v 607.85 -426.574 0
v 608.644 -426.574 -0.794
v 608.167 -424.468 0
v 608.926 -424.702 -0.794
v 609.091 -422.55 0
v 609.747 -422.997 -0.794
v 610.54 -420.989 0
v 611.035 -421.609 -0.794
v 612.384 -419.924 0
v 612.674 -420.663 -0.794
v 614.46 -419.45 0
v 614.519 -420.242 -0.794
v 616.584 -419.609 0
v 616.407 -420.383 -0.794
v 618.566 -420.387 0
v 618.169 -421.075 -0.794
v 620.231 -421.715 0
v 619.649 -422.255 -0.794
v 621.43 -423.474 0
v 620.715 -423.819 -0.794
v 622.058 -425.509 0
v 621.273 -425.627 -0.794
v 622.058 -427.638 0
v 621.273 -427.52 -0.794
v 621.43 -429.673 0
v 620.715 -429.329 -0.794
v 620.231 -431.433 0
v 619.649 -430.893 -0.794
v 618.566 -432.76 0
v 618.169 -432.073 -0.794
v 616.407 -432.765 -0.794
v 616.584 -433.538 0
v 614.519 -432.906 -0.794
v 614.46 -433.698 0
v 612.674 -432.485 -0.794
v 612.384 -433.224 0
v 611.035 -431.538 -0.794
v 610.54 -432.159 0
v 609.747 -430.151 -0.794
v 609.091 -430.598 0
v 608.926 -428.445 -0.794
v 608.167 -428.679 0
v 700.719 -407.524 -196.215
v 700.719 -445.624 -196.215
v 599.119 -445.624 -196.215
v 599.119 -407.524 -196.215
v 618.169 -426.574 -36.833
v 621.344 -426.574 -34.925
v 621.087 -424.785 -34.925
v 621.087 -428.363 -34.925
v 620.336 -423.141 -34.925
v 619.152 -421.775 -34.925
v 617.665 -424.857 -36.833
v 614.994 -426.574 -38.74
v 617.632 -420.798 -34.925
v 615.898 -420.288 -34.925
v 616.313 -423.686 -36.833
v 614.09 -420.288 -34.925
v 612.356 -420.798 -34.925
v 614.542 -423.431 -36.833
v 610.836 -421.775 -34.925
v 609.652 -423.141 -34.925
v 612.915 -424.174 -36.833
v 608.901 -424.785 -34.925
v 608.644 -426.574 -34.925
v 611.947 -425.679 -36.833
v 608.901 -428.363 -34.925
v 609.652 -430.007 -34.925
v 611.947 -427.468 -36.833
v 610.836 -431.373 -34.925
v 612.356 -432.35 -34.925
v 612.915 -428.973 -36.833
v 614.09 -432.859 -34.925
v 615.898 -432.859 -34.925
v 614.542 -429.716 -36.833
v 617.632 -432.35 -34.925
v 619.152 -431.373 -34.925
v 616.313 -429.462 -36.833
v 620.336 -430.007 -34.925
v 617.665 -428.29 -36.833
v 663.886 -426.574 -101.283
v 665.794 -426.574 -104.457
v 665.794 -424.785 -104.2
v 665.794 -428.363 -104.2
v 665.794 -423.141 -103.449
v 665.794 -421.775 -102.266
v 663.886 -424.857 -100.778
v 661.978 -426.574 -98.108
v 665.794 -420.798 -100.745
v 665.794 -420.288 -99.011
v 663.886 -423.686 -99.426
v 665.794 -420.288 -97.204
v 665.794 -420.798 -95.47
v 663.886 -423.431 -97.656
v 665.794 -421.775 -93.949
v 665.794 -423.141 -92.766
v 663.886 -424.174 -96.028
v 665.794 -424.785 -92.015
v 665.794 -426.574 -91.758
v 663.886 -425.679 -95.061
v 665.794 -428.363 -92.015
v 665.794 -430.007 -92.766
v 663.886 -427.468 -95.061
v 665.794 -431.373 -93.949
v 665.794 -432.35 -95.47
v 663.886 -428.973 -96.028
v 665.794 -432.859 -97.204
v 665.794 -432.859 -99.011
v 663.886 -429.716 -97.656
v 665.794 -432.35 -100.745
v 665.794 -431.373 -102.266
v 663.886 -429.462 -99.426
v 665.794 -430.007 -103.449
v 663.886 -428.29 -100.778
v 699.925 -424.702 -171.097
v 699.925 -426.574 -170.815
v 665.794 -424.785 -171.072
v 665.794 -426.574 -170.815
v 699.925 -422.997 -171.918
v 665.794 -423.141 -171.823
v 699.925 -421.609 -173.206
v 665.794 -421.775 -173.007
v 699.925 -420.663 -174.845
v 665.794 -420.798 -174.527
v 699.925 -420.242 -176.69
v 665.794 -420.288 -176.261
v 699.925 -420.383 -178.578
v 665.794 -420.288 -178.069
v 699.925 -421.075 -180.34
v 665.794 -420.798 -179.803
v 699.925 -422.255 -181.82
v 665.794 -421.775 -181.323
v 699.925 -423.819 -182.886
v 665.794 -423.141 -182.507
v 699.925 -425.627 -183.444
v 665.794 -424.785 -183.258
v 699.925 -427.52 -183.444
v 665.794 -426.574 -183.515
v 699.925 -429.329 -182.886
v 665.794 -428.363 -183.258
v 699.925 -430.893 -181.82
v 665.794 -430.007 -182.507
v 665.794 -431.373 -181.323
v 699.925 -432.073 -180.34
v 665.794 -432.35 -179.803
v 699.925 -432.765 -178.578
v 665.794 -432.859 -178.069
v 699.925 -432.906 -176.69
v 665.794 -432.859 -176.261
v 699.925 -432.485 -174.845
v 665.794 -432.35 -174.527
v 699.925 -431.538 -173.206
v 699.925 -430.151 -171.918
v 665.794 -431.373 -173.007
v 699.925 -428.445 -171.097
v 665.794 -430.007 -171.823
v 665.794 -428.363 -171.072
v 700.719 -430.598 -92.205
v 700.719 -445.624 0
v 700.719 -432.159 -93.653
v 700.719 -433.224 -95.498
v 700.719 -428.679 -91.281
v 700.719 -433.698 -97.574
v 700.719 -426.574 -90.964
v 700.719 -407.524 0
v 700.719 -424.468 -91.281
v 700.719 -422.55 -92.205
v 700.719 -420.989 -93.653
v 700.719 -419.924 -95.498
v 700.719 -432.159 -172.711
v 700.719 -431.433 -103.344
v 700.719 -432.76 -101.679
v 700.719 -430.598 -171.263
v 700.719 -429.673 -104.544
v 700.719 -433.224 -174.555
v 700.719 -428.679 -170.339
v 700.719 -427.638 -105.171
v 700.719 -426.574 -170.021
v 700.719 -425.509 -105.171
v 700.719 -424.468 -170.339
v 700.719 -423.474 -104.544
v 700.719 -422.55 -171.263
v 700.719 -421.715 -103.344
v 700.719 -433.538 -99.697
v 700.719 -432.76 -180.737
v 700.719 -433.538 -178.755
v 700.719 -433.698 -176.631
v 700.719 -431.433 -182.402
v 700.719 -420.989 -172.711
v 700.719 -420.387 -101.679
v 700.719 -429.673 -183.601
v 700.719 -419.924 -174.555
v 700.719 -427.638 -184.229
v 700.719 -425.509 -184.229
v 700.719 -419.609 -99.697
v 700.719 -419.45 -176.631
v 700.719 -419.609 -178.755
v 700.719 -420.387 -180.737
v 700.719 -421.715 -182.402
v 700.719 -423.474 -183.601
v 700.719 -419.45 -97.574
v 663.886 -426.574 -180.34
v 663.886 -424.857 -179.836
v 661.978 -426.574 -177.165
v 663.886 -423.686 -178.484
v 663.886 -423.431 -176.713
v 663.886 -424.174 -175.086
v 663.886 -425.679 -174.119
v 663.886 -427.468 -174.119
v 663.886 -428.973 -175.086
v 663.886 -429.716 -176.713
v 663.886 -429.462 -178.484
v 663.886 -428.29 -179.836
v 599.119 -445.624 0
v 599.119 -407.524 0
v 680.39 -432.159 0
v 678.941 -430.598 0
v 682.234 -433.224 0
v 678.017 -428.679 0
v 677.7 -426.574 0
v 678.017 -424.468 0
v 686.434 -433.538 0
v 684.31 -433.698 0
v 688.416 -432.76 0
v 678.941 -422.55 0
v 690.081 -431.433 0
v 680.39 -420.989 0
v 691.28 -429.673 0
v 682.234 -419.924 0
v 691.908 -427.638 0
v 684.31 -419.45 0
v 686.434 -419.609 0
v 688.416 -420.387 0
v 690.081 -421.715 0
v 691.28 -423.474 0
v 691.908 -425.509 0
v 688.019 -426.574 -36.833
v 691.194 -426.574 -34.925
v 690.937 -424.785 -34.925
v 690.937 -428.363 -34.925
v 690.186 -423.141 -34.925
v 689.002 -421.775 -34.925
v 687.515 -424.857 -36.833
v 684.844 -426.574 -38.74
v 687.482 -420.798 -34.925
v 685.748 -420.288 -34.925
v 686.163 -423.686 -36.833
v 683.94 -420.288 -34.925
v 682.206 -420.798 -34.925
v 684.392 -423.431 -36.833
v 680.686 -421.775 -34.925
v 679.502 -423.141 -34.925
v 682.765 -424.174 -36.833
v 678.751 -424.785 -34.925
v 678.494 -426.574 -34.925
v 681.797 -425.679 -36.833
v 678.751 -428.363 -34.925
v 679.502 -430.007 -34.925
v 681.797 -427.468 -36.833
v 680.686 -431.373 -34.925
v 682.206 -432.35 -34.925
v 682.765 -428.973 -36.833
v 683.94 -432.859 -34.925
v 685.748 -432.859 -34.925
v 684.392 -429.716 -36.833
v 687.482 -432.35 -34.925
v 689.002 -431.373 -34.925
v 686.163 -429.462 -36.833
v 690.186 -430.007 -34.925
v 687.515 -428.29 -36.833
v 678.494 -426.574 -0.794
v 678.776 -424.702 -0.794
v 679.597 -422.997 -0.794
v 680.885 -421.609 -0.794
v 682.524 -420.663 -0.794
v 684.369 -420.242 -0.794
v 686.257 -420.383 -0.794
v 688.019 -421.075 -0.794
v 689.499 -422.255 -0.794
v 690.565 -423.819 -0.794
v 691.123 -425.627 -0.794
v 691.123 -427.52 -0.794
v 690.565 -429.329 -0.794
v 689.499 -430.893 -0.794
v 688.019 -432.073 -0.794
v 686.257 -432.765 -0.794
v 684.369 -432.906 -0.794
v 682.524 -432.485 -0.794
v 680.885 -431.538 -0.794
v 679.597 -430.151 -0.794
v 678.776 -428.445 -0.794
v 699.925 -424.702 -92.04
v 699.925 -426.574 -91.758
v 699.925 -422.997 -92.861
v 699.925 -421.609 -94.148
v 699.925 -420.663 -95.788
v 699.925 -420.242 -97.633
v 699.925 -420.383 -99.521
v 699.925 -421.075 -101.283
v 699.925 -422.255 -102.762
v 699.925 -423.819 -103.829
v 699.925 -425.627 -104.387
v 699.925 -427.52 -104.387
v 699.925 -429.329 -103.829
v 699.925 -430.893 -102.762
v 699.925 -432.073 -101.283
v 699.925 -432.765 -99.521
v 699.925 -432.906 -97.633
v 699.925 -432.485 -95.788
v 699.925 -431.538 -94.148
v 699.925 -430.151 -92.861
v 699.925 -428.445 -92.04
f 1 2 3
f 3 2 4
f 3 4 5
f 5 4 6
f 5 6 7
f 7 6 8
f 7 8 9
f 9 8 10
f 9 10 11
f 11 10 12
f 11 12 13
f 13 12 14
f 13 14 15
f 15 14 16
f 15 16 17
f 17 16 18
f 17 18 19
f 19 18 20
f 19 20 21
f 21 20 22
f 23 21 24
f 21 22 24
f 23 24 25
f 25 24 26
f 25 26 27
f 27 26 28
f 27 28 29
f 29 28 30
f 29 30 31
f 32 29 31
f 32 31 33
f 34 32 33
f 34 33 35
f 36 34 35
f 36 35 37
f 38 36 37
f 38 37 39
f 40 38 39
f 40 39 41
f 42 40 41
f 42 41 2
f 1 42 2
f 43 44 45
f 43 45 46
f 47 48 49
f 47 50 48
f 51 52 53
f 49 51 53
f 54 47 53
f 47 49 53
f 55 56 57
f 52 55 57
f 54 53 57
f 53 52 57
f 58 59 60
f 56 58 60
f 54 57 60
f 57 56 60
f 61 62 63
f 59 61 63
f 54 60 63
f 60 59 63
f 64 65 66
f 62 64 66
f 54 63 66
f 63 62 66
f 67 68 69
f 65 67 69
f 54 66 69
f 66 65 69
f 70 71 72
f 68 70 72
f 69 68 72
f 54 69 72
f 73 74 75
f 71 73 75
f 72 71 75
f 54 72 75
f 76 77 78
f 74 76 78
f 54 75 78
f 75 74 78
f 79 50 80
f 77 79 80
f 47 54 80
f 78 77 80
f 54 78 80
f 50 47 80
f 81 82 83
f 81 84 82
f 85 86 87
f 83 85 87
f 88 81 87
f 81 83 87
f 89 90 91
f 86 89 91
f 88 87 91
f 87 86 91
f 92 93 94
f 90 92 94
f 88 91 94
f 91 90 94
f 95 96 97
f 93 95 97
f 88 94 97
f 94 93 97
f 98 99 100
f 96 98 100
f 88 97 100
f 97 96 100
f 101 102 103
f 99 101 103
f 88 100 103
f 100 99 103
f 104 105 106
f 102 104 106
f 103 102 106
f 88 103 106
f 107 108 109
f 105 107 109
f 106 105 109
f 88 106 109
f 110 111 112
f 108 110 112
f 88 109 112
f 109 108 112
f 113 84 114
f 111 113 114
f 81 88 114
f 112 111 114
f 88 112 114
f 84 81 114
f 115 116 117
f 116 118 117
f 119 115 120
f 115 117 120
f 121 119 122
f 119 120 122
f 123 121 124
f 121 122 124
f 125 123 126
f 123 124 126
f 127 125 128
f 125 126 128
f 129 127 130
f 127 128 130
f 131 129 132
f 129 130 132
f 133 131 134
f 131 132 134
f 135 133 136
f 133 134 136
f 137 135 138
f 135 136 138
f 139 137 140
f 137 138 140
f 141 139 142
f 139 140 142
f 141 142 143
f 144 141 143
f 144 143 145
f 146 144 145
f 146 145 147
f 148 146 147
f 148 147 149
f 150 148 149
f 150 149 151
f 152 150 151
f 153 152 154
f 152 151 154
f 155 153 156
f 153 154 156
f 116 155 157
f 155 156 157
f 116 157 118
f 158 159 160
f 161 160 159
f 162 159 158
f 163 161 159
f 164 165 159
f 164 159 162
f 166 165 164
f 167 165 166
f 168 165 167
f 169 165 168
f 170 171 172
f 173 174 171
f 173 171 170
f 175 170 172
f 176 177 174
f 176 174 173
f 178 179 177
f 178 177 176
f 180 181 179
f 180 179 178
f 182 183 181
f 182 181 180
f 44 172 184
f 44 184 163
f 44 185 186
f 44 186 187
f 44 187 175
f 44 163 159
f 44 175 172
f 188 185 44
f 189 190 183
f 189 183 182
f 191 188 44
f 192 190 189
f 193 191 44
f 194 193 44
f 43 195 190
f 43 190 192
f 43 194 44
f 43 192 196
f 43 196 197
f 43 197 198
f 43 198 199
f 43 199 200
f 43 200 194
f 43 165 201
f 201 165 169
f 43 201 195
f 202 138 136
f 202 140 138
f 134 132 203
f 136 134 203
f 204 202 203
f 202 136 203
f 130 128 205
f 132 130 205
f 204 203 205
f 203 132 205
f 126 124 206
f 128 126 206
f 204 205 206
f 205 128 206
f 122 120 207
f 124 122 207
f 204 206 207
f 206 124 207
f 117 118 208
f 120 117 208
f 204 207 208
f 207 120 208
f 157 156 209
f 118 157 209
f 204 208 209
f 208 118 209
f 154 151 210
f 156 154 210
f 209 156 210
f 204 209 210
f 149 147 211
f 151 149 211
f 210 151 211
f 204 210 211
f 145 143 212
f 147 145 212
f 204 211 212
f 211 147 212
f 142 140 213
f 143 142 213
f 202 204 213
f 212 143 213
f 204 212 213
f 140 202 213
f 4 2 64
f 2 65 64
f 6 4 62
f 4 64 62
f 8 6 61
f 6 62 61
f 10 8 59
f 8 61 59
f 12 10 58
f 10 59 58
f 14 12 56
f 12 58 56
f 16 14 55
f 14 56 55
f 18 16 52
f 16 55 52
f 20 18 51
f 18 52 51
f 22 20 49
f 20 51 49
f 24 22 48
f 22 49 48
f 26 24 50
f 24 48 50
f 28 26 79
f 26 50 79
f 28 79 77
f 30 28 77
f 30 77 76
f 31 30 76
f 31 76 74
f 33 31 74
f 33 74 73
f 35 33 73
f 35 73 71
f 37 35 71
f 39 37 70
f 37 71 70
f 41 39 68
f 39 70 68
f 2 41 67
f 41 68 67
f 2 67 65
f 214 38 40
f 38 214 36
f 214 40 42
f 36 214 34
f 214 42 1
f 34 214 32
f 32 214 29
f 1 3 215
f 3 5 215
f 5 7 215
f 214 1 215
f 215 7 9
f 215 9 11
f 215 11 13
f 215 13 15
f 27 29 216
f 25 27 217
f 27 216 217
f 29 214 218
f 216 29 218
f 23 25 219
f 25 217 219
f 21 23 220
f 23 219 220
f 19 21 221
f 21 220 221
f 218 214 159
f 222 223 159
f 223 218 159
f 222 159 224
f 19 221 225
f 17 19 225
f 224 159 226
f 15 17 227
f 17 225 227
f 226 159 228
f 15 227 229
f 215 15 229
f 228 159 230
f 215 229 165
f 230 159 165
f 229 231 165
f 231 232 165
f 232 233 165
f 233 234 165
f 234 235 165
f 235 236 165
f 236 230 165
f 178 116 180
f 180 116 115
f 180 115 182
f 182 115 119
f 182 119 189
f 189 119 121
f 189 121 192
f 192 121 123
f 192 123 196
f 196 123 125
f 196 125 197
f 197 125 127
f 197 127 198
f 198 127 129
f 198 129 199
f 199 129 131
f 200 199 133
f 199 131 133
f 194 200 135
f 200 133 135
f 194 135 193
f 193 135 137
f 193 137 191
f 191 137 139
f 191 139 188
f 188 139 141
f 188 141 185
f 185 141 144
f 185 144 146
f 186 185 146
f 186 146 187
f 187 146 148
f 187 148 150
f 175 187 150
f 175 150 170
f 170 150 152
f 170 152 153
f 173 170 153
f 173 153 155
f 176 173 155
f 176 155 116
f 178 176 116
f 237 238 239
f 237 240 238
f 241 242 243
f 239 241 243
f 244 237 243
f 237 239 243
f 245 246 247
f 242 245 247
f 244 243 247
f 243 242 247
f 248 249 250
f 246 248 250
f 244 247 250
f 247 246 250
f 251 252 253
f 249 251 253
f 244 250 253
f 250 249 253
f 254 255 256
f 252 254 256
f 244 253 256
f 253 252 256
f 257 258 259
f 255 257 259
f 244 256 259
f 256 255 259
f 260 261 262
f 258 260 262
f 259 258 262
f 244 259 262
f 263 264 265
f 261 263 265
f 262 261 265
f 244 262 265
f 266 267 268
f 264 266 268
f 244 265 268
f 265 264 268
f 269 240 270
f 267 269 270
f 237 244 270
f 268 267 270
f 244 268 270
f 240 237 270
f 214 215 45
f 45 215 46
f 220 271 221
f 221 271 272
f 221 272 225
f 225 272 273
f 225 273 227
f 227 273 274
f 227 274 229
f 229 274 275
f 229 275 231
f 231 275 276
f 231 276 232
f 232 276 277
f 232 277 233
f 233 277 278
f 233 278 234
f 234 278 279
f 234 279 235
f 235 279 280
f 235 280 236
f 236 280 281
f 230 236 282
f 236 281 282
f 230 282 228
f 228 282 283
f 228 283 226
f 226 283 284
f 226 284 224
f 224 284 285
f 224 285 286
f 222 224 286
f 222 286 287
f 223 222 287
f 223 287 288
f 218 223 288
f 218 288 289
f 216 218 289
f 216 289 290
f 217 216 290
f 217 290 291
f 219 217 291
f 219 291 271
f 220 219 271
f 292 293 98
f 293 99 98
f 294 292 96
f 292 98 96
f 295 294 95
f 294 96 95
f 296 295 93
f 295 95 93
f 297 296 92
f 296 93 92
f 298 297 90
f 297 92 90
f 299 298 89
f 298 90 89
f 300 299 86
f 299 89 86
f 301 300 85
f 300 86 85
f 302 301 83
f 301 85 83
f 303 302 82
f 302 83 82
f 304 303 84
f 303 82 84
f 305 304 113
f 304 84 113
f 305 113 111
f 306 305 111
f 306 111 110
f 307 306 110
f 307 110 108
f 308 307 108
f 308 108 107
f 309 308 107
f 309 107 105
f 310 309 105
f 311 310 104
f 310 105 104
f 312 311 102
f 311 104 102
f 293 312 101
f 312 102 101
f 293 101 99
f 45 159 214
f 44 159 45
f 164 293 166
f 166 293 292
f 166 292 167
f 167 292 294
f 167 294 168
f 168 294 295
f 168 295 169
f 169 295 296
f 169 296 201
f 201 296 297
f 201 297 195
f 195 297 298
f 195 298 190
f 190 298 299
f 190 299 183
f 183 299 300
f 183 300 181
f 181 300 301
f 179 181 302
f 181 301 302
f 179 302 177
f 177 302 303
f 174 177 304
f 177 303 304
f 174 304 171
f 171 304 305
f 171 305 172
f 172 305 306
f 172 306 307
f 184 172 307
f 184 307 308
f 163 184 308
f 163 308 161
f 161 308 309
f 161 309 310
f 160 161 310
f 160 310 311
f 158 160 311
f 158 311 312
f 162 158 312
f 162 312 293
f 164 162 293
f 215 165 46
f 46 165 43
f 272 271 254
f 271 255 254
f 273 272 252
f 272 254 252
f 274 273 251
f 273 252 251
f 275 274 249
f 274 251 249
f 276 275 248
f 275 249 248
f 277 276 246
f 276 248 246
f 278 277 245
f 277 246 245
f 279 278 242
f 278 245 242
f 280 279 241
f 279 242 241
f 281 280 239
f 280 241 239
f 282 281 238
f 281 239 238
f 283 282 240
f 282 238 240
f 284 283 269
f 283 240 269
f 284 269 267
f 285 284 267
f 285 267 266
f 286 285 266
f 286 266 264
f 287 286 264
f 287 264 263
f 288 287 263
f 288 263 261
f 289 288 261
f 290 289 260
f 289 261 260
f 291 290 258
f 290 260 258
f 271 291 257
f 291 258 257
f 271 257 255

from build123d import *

# Parameters (mm, degrees)
F0_W           = 196.215
F0_H           = 38.1
F0_R           = 10.16
F0_R_2         = 6.604
F1_DEPTH       = 101.6
F2_D           = 12.7
F2_DEPTH       = 34.925
F2_CSINK_D     = 14.2875
F2_CSINK_ANGLE = 90
F2_TIP         = 3.8154649308
F3_ANGLE       = -90
F5_D           = 12.7
F5_DEPTH       = 34.925
F5_CSINK_D     = 14.2875
F5_CSINK_ANGLE = 90
F5_TIP         = 3.8154649308


with BuildPart() as f1:
    # F0 (on Top) → F1 (new body)
    with BuildSketch(Plane.XY):
        with Locations((849.6263678, -426.5737722)):
            Rectangle(F0_W, F0_H)
        with Locations((770.5688678, -426.5737722)):
            Circle(F0_R, mode=Mode.SUBTRACT)
        with Locations((849.6263678, -426.5737722)):
            Circle(F0_R, mode=Mode.SUBTRACT)
        with Locations((928.6838678, -426.5737722)):
            Circle(F0_R, mode=Mode.SUBTRACT)
        with Locations((770.5688678, -426.5737722)):
            Circle(F0_R)
        with Locations((770.5688678, -426.5737722)):
            Circle(F0_R_2, mode=Mode.SUBTRACT)
        with Locations((928.6838678, -426.5737722)):
            Circle(F0_R)
        with Locations((928.6838678, -426.5737722)):
            Circle(F0_R_2, mode=Mode.SUBTRACT)
        with Locations((849.6263678, -426.5737722)):
            Circle(F0_R)
        with Locations((849.6263678, -426.5737722)):
            Circle(F0_R_2, mode=Mode.SUBTRACT)
        with Locations((770.5688678, -426.5737722)):
            Circle(F0_R_2)
        with Locations((849.6263678, -426.5737722)):
            Circle(F0_R_2)
        with Locations((928.6838678, -426.5737722)):
            Circle(F0_R_2)
    extrude(amount=-F1_DEPTH)

    # F2
    with Locations(Plane.XY):
        with Locations((928.6838678, -426.5737722), (849.6263678, -426.5737722)):
            CounterSinkHole(F2_D / 2, F2_CSINK_D / 2, depth=F2_DEPTH, counter_sink_angle=F2_CSINK_ANGLE)
            with Locations((0, 0, -(F2_DEPTH + F2_TIP / 2))):  # 118° drill point
                Cone(0, F2_D / 2, F2_TIP, mode=Mode.SUBTRACT)


with BuildPart() as f1_1:
    # F3: moved
    add(f1.part.rotate(Axis((751.5188678, -426.5737722, 0), (0, -1, 0)), F3_ANGLE))


with BuildPart() as f1_2:
    # F4: moved
    add(f1_1.part.moved(Location((-50.8, 0, 0))))

    # F5
    with Locations(Plane.XY):
        with Locations((614.9938678, -426.5737722), (684.8438678, -426.5737722)):
            CounterSinkHole(F5_D / 2, F5_CSINK_D / 2, depth=F5_DEPTH, counter_sink_angle=F5_CSINK_ANGLE)
            with Locations((0, 0, -(F5_DEPTH + F5_TIP / 2))):  # 118° drill point
                Cone(0, F5_D / 2, F5_TIP, mode=Mode.SUBTRACT)


solid = f1_2.part
